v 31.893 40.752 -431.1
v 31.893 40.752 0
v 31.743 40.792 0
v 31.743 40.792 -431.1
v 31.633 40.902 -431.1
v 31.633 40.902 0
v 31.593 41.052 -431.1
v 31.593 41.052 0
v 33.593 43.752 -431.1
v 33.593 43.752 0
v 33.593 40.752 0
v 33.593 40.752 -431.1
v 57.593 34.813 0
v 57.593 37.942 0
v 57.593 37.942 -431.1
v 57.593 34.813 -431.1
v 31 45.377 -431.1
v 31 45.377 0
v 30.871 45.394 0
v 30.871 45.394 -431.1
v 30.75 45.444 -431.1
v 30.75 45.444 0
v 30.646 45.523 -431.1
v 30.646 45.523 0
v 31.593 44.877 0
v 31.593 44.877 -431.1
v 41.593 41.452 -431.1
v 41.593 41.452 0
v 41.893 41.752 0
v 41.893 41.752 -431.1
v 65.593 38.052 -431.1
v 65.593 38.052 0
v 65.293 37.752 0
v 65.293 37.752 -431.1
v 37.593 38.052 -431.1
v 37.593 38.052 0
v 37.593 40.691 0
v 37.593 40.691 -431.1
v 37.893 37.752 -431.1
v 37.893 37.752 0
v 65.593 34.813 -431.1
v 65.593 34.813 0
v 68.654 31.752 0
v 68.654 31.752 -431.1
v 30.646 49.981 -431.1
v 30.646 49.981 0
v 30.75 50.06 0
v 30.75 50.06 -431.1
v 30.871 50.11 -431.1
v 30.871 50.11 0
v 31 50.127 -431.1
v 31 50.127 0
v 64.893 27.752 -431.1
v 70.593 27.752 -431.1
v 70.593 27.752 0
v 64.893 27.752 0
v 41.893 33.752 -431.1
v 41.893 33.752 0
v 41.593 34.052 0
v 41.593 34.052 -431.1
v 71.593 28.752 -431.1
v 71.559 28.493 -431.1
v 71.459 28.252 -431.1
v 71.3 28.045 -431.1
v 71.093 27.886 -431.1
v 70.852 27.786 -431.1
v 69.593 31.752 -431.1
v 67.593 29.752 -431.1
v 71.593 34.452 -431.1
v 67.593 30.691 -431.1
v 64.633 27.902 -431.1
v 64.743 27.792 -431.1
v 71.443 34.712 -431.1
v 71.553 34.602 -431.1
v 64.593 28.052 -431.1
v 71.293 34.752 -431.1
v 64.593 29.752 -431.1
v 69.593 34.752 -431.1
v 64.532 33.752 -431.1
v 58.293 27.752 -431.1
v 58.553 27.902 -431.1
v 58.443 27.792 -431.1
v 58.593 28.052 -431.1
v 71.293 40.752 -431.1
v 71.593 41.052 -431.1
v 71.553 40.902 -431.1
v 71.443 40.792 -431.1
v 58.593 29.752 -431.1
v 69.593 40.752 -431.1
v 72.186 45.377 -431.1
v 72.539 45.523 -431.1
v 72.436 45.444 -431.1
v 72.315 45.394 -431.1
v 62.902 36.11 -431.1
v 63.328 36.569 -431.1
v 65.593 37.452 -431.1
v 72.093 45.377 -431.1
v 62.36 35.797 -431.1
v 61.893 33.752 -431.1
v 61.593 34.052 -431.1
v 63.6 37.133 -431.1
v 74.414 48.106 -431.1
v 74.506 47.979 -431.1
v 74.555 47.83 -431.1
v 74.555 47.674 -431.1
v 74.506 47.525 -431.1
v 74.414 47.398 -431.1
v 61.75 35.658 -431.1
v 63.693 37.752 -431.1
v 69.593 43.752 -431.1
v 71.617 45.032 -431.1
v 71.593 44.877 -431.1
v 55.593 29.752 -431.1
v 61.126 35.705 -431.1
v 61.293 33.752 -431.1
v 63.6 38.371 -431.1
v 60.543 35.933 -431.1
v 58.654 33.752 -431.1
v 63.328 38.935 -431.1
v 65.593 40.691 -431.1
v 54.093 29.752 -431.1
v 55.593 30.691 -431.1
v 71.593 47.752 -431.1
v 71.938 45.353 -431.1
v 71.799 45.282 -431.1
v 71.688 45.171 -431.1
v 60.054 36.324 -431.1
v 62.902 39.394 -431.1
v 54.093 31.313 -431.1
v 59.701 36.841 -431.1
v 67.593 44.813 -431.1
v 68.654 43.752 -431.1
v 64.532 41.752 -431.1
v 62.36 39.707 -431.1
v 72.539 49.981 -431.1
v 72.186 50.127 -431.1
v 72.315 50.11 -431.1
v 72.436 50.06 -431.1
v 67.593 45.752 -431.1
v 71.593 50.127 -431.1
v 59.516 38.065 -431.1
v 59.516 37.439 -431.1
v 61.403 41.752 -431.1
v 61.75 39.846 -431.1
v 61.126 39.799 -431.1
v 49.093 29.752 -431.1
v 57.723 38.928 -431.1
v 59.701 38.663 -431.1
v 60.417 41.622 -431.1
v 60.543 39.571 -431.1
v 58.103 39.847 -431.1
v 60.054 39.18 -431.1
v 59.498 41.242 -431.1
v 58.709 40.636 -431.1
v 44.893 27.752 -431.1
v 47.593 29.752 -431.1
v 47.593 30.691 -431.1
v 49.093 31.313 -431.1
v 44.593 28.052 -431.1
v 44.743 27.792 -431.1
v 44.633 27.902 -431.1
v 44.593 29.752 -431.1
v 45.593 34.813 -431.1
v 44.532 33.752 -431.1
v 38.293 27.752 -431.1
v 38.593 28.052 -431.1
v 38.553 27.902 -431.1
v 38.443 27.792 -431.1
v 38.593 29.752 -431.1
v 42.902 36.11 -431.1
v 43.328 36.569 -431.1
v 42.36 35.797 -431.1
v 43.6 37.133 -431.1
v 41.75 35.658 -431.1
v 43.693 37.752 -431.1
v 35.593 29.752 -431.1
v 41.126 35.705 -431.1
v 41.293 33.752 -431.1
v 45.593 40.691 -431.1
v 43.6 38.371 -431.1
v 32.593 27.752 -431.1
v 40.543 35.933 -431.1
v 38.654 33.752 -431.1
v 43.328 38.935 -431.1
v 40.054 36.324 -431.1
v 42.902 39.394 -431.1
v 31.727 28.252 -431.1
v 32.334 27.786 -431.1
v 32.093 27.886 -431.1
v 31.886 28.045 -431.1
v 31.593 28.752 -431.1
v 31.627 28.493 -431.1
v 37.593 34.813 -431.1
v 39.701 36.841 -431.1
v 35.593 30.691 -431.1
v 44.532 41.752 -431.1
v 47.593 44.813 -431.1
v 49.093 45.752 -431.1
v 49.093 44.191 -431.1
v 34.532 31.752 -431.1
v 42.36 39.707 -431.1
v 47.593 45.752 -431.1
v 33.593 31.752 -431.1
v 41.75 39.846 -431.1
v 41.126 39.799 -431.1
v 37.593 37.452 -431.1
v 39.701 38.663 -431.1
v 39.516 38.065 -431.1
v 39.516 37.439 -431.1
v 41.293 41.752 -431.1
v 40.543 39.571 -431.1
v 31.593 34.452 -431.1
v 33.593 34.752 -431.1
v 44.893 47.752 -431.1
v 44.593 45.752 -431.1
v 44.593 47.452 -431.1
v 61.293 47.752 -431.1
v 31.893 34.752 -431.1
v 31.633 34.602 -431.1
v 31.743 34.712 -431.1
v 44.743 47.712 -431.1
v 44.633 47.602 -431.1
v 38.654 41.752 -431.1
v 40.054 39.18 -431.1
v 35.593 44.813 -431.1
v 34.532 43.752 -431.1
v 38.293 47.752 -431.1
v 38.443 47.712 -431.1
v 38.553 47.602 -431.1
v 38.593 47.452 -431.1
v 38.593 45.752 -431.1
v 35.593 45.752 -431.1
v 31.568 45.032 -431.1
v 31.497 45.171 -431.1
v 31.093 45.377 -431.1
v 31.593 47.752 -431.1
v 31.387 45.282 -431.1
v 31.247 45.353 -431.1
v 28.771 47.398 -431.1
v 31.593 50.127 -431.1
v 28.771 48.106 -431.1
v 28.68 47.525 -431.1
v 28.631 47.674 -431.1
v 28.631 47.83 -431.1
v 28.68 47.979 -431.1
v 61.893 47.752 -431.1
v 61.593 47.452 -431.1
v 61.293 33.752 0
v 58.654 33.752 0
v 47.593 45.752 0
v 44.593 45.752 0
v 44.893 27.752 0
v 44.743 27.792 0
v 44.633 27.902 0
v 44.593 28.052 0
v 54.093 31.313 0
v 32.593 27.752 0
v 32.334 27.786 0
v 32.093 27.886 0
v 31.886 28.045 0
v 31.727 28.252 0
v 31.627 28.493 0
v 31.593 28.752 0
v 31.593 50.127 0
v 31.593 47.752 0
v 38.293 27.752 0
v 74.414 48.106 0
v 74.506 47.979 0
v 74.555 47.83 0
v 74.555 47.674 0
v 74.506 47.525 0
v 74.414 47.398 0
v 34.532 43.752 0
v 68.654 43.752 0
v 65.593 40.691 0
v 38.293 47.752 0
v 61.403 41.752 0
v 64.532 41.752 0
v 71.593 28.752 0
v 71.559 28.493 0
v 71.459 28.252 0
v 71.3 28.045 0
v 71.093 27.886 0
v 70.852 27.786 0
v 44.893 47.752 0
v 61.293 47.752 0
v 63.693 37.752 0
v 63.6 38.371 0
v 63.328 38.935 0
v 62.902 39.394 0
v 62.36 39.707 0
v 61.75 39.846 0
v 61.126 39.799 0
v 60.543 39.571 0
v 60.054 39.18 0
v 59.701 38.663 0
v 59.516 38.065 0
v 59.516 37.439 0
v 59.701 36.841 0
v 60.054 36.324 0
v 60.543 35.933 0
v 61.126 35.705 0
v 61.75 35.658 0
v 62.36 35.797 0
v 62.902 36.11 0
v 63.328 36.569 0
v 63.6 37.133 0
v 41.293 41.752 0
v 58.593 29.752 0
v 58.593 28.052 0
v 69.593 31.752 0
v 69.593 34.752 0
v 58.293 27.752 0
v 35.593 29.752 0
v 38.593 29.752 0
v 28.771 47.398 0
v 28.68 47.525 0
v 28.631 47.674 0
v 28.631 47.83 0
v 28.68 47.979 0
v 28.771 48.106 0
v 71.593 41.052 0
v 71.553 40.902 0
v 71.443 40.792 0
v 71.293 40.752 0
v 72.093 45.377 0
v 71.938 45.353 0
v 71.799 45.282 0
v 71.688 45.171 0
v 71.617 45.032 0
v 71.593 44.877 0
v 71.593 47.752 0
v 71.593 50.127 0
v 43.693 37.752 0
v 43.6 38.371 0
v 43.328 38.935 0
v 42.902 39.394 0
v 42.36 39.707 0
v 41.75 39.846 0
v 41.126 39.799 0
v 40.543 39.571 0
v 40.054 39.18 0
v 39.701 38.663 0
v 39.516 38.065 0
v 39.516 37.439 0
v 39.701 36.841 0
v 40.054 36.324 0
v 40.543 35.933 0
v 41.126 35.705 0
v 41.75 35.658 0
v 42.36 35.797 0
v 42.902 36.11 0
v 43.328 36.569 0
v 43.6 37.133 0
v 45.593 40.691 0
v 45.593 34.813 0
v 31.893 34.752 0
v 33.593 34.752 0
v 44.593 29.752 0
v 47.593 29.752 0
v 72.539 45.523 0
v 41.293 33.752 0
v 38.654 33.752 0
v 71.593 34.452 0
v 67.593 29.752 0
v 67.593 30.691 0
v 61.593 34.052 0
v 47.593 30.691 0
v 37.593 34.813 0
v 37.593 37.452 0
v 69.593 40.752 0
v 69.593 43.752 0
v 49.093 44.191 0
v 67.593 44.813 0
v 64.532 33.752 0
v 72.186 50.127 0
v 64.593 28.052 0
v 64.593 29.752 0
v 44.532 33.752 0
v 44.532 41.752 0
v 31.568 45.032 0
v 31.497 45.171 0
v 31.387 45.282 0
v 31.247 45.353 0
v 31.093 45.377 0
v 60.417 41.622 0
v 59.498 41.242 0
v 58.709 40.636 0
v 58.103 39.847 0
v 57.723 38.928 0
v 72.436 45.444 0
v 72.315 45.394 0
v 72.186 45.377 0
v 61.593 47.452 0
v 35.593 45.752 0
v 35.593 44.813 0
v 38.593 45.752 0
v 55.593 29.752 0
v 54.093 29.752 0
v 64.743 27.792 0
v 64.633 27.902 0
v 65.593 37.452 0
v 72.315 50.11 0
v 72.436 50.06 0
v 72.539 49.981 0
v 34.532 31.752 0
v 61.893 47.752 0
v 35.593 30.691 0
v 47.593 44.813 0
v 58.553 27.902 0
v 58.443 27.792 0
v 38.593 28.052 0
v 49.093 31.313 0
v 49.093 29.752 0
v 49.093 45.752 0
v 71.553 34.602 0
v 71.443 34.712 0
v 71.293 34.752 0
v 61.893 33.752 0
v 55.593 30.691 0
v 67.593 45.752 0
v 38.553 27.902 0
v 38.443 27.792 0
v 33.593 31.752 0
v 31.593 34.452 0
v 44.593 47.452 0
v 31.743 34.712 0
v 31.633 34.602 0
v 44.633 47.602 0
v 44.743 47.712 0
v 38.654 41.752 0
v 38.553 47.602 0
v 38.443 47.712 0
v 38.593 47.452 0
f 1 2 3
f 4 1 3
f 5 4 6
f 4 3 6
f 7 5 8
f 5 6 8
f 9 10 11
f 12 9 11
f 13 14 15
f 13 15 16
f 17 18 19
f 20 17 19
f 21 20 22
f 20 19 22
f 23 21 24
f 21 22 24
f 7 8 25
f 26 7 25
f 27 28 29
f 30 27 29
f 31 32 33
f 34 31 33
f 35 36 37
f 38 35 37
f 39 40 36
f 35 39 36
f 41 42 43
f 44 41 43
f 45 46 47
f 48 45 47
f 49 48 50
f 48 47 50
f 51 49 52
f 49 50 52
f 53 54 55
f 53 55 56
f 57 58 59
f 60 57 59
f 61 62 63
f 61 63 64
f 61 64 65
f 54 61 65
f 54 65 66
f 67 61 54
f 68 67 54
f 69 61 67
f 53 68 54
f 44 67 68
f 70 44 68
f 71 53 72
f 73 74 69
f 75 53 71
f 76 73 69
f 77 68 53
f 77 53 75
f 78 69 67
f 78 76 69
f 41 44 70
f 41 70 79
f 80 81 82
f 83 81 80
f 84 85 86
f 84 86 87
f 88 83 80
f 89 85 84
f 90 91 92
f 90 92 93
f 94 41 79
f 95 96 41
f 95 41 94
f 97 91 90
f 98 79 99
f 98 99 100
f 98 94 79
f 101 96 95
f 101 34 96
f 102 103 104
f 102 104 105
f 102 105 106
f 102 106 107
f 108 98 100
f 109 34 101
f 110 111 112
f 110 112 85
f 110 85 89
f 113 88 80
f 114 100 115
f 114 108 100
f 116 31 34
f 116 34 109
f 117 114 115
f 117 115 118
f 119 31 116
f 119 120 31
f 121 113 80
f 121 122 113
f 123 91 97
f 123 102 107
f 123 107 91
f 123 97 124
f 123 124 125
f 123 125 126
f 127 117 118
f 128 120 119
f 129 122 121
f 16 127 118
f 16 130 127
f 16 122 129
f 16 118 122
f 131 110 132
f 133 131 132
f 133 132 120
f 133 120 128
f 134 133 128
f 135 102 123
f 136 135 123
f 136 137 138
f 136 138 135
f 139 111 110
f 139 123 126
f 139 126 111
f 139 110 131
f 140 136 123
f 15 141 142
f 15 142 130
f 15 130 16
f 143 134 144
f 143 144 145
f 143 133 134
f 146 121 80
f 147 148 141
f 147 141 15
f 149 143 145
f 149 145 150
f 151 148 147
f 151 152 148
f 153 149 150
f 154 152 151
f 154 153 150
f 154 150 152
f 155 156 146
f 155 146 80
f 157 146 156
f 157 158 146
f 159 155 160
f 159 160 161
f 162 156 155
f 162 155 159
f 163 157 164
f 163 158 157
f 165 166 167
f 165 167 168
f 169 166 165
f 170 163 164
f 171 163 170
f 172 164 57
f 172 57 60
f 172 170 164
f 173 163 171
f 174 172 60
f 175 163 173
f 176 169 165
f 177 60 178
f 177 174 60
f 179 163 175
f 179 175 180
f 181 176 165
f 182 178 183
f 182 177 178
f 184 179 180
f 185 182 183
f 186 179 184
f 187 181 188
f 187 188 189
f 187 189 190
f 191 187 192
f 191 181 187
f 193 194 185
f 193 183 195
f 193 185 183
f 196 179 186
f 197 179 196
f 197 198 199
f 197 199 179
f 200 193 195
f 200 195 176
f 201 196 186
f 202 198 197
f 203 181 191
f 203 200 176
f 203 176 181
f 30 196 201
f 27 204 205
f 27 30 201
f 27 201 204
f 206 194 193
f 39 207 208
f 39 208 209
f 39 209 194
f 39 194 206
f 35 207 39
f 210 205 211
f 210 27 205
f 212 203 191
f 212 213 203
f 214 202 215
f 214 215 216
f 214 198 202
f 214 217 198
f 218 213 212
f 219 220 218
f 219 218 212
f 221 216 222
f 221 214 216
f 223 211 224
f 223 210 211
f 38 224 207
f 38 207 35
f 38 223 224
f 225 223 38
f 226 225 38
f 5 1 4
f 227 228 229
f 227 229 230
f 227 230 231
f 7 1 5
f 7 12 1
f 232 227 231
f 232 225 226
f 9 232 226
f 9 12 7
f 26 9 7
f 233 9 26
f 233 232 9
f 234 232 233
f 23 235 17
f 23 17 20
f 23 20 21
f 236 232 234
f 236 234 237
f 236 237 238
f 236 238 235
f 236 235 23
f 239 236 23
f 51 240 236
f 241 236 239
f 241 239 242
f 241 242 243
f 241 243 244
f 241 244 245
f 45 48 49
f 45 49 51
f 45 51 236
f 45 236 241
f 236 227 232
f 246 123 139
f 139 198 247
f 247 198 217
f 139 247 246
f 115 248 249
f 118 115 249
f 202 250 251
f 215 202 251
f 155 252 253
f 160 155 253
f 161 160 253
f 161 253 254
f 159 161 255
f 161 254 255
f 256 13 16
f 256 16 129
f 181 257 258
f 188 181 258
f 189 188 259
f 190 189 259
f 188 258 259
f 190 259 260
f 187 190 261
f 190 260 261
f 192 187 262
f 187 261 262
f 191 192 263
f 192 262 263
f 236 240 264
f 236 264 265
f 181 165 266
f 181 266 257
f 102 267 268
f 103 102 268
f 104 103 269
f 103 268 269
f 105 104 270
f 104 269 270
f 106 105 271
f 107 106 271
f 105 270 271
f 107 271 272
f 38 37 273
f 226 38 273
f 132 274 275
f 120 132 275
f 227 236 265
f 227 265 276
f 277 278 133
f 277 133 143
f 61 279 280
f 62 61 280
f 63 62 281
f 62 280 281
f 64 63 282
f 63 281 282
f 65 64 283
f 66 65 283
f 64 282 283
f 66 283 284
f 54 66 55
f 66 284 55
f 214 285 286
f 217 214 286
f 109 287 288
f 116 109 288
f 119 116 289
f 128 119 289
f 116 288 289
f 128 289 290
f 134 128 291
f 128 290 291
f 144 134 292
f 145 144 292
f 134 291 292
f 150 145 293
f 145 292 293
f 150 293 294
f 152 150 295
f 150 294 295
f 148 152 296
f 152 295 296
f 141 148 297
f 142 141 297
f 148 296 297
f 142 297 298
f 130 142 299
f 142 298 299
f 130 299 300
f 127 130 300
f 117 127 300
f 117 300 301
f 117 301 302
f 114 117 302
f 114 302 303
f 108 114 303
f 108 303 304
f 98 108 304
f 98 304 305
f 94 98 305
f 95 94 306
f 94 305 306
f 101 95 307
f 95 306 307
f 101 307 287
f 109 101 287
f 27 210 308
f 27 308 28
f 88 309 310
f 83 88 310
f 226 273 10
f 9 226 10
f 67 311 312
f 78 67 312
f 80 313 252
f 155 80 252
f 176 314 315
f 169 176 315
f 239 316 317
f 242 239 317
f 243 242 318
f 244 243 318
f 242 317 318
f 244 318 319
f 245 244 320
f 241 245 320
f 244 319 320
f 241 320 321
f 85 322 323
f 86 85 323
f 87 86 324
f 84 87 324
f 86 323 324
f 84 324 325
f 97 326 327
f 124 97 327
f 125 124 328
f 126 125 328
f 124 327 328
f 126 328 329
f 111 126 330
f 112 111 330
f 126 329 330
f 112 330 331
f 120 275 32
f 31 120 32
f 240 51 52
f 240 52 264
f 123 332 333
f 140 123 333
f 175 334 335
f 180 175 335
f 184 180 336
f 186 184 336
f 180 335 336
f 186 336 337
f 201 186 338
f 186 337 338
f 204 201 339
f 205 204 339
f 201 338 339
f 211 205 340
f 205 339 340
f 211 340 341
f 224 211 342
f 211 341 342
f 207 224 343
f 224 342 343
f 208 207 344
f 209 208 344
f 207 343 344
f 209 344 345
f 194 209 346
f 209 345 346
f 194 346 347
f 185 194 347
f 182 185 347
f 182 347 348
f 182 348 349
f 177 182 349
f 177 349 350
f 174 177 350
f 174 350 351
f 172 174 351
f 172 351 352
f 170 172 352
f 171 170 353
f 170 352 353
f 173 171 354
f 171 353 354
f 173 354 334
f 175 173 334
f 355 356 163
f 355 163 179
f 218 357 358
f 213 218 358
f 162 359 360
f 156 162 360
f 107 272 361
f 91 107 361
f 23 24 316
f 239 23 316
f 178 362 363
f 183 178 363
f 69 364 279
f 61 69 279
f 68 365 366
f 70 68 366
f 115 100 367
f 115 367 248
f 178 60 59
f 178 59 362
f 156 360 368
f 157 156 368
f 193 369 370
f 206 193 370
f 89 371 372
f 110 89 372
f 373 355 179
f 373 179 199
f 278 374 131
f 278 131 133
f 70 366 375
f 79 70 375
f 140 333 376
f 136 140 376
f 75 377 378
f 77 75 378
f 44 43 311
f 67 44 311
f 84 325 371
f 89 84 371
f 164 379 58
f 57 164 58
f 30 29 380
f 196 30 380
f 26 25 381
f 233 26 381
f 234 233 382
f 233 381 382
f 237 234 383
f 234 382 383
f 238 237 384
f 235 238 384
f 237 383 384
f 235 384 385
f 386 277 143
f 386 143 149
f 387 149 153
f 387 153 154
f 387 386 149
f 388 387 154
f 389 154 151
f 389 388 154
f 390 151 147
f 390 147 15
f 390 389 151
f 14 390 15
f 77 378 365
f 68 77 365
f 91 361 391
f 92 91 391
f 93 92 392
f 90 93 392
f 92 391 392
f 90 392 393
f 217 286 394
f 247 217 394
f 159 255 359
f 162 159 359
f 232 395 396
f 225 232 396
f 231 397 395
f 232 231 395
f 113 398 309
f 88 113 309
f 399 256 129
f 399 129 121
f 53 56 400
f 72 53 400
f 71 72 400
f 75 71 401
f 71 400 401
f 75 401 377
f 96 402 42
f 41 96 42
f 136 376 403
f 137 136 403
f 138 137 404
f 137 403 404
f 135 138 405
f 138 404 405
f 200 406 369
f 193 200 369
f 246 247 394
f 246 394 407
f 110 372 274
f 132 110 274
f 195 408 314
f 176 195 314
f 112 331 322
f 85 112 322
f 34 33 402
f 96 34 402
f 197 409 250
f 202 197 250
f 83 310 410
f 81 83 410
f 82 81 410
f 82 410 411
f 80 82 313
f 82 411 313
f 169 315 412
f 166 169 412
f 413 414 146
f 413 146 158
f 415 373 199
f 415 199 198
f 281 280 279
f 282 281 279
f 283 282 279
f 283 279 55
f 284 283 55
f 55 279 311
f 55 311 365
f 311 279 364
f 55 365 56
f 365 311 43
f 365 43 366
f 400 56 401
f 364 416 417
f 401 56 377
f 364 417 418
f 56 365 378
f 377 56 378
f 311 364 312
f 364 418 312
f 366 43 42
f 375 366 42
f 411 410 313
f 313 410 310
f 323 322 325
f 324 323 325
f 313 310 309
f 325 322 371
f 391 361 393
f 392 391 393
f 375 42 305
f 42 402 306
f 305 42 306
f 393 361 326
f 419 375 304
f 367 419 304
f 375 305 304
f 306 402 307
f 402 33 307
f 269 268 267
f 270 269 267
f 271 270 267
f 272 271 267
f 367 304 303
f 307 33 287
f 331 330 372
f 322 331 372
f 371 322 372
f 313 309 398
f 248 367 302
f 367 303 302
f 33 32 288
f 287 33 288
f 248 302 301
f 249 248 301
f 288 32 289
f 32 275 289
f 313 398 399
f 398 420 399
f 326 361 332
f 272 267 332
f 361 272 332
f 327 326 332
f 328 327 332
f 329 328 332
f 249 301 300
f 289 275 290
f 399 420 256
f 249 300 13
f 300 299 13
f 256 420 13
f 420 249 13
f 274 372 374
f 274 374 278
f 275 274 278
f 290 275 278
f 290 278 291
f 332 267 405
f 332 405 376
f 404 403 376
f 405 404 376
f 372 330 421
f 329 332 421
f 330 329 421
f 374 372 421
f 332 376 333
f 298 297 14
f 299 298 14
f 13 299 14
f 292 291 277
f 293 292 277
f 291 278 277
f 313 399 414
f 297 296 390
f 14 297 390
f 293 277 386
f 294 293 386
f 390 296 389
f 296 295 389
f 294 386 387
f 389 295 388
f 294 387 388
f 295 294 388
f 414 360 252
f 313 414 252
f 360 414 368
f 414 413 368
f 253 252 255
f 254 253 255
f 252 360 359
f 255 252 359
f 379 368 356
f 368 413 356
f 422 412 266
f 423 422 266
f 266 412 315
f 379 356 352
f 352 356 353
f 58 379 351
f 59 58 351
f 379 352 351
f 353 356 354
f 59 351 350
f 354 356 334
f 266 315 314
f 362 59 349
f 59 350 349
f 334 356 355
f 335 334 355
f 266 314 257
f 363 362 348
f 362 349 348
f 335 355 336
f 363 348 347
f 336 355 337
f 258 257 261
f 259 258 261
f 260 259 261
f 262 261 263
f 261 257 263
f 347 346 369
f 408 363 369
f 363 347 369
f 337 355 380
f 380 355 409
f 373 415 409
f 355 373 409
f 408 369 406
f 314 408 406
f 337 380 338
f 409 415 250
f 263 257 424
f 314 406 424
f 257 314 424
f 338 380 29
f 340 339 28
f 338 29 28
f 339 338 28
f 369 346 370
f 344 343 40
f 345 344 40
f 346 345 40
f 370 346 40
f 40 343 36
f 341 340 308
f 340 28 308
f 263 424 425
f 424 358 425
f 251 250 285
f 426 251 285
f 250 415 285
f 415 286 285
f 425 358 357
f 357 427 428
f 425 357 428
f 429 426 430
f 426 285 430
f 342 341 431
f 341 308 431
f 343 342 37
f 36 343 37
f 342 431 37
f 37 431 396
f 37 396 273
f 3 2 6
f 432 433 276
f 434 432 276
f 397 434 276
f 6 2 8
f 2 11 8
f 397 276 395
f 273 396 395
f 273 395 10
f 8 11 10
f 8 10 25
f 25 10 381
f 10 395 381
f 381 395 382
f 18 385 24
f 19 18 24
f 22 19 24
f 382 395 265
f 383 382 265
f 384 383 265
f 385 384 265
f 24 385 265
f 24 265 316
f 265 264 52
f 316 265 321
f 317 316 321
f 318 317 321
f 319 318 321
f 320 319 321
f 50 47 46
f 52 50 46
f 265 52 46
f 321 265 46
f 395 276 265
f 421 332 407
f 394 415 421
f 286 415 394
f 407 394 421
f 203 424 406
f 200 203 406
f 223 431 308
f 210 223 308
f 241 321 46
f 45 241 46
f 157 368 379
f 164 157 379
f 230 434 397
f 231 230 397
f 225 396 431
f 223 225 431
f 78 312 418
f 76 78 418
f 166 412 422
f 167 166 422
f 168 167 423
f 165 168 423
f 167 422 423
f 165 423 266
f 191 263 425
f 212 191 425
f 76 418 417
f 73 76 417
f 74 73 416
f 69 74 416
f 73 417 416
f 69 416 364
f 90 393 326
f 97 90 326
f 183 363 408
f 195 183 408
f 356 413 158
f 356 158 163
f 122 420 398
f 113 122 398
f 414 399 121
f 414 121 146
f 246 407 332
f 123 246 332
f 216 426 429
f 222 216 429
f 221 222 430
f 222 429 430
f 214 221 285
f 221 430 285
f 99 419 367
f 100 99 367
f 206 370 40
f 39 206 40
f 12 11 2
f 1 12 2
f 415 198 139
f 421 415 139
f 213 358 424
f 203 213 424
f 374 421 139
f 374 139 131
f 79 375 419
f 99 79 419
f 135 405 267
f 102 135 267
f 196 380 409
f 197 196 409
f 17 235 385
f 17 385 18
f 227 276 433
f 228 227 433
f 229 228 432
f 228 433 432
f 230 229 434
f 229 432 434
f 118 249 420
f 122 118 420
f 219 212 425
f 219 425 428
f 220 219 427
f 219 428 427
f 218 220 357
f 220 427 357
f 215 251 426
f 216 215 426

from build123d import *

# Parameters (mm, degrees)
MODEL_R             = 2.100000001
BOSS_EXTRUDE1_DEPTH = 431.1


with BuildPart() as part:
    # Model → Boss-Extrude1 (new body)
    with BuildSketch(Plane.XY):
        with BuildLine():
            Line((28.771485975, 48.105572105), (30.646485975, 49.980572105))
            ThreePointArc((30.646485975, 49.980572105), (30.808697649, 50.08895848), (31.000039365, 50.127018713))
            Line((31.000039365, 50.127018713), (31.592932584, 50.127018713))
            Line((31.592932584, 50.127018713), (31.592932584, 47.752018713))
            Line((31.592932584, 47.752018713), (38.292932585, 47.752018713))
            ThreePointArc((38.292932585, 47.752018713), (38.505064619, 47.664150748), (38.592932584, 47.452018714))
            Line((38.592932584, 47.452018714), (38.592932584, 45.752018713))
            Line((38.592932584, 45.752018713), (35.592932585, 45.752018713))
            Line((35.592932585, 45.752018713), (35.592932585, 44.812678885))
            Line((35.592932585, 44.812678885), (38.653592756, 41.752018713))
            Line((38.653592756, 41.752018713), (41.292932583, 41.752018713))
            Line((41.292932583, 41.752018713), (41.592932584, 41.452018713))
            Line((41.592932584, 41.452018713), (41.892932586, 41.752018714))
            Line((41.892932586, 41.752018714), (44.532272412, 41.752018714))
            Line((44.532272412, 41.752018714), (47.592932584, 44.812678886))
            Line((47.592932584, 44.812678886), (47.592932584, 45.752018714))
            Line((47.592932584, 45.752018714), (44.592932584, 45.752018714))
            Line((44.592932584, 45.752018714), (44.592932584, 47.452018715))
            ThreePointArc((44.592932584, 47.452018715), (44.68080055, 47.664150749), (44.892932584, 47.752018715))
            Line((44.892932584, 47.752018715), (61.292932583, 47.752018715))
            Line((61.292932583, 47.752018715), (61.592932582, 47.452018715))
            Line((61.592932582, 47.452018715), (61.892932583, 47.752018716))
            Line((61.892932583, 47.752018716), (71.592932583, 47.752018716))
            Line((71.592932583, 47.752018716), (71.592932583, 50.127018711))
            Line((71.592932583, 50.127018711), (72.185825802, 50.127018711))
            ThreePointArc((72.185825802, 50.127018711), (72.377167518, 50.088958477), (72.539379192, 49.980572102))
            Line((72.539379192, 49.980572102), (74.414379192, 48.105572102))
            ThreePointArc((74.414379192, 48.105572102), (74.560825801, 47.752018712), (74.414379192, 47.398465322))
            Line((74.414379192, 47.398465322), (72.539379192, 45.523465322))
            ThreePointArc((72.539379192, 45.523465322), (72.377167518, 45.415078947), (72.185825802, 45.377018714))
            Line((72.185825802, 45.377018714), (72.092932582, 45.377018714))
            ThreePointArc((72.092932582, 45.377018714), (71.739379192, 45.230572103), (71.592932583, 44.877018713))
            Line((71.592932583, 44.877018713), (71.592932583, 41.052018712))
            ThreePointArc((71.592932583, 41.052018712), (71.505064617, 40.839886678), (71.292932581, 40.752018713))
            Line((71.292932581, 40.752018713), (69.592932583, 40.752018713))
            Line((69.592932583, 40.752018713), (69.592932583, 43.752018712))
            Line((69.592932583, 43.752018712), (68.653592755, 43.752018712))
            Line((68.653592755, 43.752018712), (65.592932583, 40.691358541))
            Line((65.592932583, 40.691358541), (65.592932583, 38.052018712))
            Line((65.592932583, 38.052018712), (65.292932584, 37.752018712))
            Line((65.292932584, 37.752018712), (65.592932583, 37.452018713))
            Line((65.592932583, 37.452018713), (65.592932583, 34.812678884))
            Line((65.592932583, 34.812678884), (68.653592755, 31.752018712))
            Line((68.653592755, 31.752018712), (69.592932583, 31.752018712))
            Line((69.592932583, 31.752018712), (69.592932583, 34.752018711))
            Line((69.592932583, 34.752018711), (71.292932581, 34.752018711))
            ThreePointArc((71.292932581, 34.752018711), (71.505064617, 34.664150747), (71.592932583, 34.452018712))
            Line((71.592932583, 34.452018712), (71.592932583, 28.75201871))
            ThreePointArc((71.592932583, 28.75201871), (71.300039364, 28.044911929), (70.592932582, 27.752018711))
            Line((70.592932582, 27.752018711), (64.892932582, 27.752018711))
            ThreePointArc((64.892932582, 27.752018711), (64.680800548, 27.839886676), (64.592932583, 28.05201871))
            Line((64.592932583, 28.05201871), (64.592932583, 29.752018711))
            Line((64.592932583, 29.752018711), (67.592932582, 29.752018711))
            Line((67.592932582, 29.752018711), (67.592932582, 30.69135854))
            Line((67.592932582, 30.69135854), (64.532272411, 33.752018711))
            Line((64.532272411, 33.752018711), (61.892932584, 33.752018711))
            Line((61.892932584, 33.752018711), (61.592932582, 34.052018713))
            Line((61.592932582, 34.052018713), (61.292932582, 33.752018712))
            Line((61.292932582, 33.752018712), (58.653592755, 33.752018712))
            Line((58.653592755, 33.752018712), (55.592932583, 30.691358541))
            Line((55.592932583, 30.691358541), (55.592932583, 29.752018713))
            Line((55.592932583, 29.752018713), (58.592932583, 29.752018713))
            Line((58.592932583, 29.752018713), (58.592932583, 28.052018712))
            ThreePointArc((58.592932583, 28.052018712), (58.505064617, 27.839886678), (58.292932583, 27.752018712))
            Line((58.292932583, 27.752018712), (44.892932584, 27.752018712))
            ThreePointArc((44.892932584, 27.752018712), (44.68080055, 27.839886678), (44.592932584, 28.052018712))
            Line((44.592932584, 28.052018712), (44.592932584, 29.752018713))
            Line((44.592932584, 29.752018713), (47.592932584, 29.752018713))
            Line((47.592932584, 29.752018713), (47.592932584, 30.691358541))
            Line((47.592932584, 30.691358541), (44.532272412, 33.752018712))
            Line((44.532272412, 33.752018712), (41.892932586, 33.752018712))
            Line((41.892932586, 33.752018712), (41.592932584, 34.052018714))
            Line((41.592932584, 34.052018714), (41.292932583, 33.752018714))
            Line((41.292932583, 33.752018714), (38.653592756, 33.752018714))
            Line((38.653592756, 33.752018714), (35.592932585, 30.691358542))
            Line((35.592932585, 30.691358542), (35.592932585, 29.752018714))
            Line((35.592932585, 29.752018714), (38.592932584, 29.752018714))
            Line((38.592932584, 29.752018714), (38.592932584, 28.052018713))
            ThreePointArc((38.592932584, 28.052018713), (38.505064619, 27.839886679), (38.292932585, 27.752018714))
            Line((38.292932585, 27.752018714), (32.592932585, 27.752018714))
            ThreePointArc((32.592932585, 27.752018714), (31.885825803, 28.044911931), (31.592932584, 28.752018713))
            Line((31.592932584, 28.752018713), (31.592932584, 34.452018715))
            ThreePointArc((31.592932584, 34.452018715), (31.68080055, 34.664150748), (31.892932583, 34.752018714))
            Line((31.892932583, 34.752018714), (33.592932584, 34.752018714))
            Line((33.592932584, 34.752018714), (33.592932584, 31.752018715))
            Line((33.592932584, 31.752018715), (34.532272412, 31.752018715))
            Line((34.532272412, 31.752018715), (37.592932584, 34.812678886))
            Line((37.592932584, 34.812678886), (37.592932584, 37.452018715))
            Line((37.592932584, 37.452018715), (37.892932583, 37.752018715))
            Line((37.892932583, 37.752018715), (37.592932584, 38.052018714))
            Line((37.592932584, 38.052018714), (37.592932584, 40.691358543))
            Line((37.592932584, 40.691358543), (34.532272412, 43.752018715))
            Line((34.532272412, 43.752018715), (33.592932584, 43.752018715))
            Line((33.592932584, 43.752018715), (33.592932584, 40.752018716))
            Line((33.592932584, 40.752018716), (31.892932586, 40.752018716))
            ThreePointArc((31.892932586, 40.752018716), (31.68080055, 40.83988668), (31.592932584, 41.052018715))
            Line((31.592932584, 41.052018715), (31.592932584, 44.877018715))
            ThreePointArc((31.592932584, 44.877018715), (31.446485975, 45.230572106), (31.092932585, 45.377018716))
            Line((31.092932585, 45.377018716), (31.000039365, 45.377018716))
            ThreePointArc((31.000039365, 45.377018716), (30.808697649, 45.41507895), (30.646485975, 45.523465324))
            Line((30.646485975, 45.523465324), (28.771485975, 47.398465325))
            ThreePointArc((28.771485975, 47.398465325), (28.625039366, 47.752018715), (28.771485975, 48.105572105))
        make_face()
        with Locations((61.592932582, 37.752018715)):
            Circle(MODEL_R, mode=Mode.SUBTRACT)
        with Locations((41.592932582, 37.752018715)):
            Circle(MODEL_R, mode=Mode.SUBTRACT)
        with BuildLine():
            Line((54.092932584, 29.752018715), (49.092932584, 29.752018715))
            Line((49.092932584, 29.752018715), (49.092932584, 31.312678886))
            Line((49.092932584, 31.312678886), (45.592932583, 34.812678886))
            Line((45.592932583, 34.812678886), (45.592932583, 40.691358543))
            Line((45.592932583, 40.691358543), (49.092932584, 44.191358544))
            Line((49.092932584, 44.191358544), (49.092932584, 45.752018714))
            Line((49.092932584, 45.752018714), (67.592932582, 45.752018714))
            Line((67.592932582, 45.752018714), (67.592932582, 44.812678887))
            Line((67.592932582, 44.812678887), (64.532272411, 41.752018716))
            Line((64.532272411, 41.752018716), (61.402932584, 41.752018716))
            ThreePointArc((61.402932584, 41.752018716), (58.708855747, 40.636095552), (57.592932584, 37.942018716))
            Line((57.592932584, 37.942018716), (57.592932584, 34.812678886))
            Line((57.592932584, 34.812678886), (54.092932584, 31.312678886))
            Line((54.092932584, 31.312678886), (54.092932584, 29.752018715))
        make_face(mode=Mode.SUBTRACT)
    extrude(amount=-BOSS_EXTRUDE1_DEPTH)


solid = part.part
